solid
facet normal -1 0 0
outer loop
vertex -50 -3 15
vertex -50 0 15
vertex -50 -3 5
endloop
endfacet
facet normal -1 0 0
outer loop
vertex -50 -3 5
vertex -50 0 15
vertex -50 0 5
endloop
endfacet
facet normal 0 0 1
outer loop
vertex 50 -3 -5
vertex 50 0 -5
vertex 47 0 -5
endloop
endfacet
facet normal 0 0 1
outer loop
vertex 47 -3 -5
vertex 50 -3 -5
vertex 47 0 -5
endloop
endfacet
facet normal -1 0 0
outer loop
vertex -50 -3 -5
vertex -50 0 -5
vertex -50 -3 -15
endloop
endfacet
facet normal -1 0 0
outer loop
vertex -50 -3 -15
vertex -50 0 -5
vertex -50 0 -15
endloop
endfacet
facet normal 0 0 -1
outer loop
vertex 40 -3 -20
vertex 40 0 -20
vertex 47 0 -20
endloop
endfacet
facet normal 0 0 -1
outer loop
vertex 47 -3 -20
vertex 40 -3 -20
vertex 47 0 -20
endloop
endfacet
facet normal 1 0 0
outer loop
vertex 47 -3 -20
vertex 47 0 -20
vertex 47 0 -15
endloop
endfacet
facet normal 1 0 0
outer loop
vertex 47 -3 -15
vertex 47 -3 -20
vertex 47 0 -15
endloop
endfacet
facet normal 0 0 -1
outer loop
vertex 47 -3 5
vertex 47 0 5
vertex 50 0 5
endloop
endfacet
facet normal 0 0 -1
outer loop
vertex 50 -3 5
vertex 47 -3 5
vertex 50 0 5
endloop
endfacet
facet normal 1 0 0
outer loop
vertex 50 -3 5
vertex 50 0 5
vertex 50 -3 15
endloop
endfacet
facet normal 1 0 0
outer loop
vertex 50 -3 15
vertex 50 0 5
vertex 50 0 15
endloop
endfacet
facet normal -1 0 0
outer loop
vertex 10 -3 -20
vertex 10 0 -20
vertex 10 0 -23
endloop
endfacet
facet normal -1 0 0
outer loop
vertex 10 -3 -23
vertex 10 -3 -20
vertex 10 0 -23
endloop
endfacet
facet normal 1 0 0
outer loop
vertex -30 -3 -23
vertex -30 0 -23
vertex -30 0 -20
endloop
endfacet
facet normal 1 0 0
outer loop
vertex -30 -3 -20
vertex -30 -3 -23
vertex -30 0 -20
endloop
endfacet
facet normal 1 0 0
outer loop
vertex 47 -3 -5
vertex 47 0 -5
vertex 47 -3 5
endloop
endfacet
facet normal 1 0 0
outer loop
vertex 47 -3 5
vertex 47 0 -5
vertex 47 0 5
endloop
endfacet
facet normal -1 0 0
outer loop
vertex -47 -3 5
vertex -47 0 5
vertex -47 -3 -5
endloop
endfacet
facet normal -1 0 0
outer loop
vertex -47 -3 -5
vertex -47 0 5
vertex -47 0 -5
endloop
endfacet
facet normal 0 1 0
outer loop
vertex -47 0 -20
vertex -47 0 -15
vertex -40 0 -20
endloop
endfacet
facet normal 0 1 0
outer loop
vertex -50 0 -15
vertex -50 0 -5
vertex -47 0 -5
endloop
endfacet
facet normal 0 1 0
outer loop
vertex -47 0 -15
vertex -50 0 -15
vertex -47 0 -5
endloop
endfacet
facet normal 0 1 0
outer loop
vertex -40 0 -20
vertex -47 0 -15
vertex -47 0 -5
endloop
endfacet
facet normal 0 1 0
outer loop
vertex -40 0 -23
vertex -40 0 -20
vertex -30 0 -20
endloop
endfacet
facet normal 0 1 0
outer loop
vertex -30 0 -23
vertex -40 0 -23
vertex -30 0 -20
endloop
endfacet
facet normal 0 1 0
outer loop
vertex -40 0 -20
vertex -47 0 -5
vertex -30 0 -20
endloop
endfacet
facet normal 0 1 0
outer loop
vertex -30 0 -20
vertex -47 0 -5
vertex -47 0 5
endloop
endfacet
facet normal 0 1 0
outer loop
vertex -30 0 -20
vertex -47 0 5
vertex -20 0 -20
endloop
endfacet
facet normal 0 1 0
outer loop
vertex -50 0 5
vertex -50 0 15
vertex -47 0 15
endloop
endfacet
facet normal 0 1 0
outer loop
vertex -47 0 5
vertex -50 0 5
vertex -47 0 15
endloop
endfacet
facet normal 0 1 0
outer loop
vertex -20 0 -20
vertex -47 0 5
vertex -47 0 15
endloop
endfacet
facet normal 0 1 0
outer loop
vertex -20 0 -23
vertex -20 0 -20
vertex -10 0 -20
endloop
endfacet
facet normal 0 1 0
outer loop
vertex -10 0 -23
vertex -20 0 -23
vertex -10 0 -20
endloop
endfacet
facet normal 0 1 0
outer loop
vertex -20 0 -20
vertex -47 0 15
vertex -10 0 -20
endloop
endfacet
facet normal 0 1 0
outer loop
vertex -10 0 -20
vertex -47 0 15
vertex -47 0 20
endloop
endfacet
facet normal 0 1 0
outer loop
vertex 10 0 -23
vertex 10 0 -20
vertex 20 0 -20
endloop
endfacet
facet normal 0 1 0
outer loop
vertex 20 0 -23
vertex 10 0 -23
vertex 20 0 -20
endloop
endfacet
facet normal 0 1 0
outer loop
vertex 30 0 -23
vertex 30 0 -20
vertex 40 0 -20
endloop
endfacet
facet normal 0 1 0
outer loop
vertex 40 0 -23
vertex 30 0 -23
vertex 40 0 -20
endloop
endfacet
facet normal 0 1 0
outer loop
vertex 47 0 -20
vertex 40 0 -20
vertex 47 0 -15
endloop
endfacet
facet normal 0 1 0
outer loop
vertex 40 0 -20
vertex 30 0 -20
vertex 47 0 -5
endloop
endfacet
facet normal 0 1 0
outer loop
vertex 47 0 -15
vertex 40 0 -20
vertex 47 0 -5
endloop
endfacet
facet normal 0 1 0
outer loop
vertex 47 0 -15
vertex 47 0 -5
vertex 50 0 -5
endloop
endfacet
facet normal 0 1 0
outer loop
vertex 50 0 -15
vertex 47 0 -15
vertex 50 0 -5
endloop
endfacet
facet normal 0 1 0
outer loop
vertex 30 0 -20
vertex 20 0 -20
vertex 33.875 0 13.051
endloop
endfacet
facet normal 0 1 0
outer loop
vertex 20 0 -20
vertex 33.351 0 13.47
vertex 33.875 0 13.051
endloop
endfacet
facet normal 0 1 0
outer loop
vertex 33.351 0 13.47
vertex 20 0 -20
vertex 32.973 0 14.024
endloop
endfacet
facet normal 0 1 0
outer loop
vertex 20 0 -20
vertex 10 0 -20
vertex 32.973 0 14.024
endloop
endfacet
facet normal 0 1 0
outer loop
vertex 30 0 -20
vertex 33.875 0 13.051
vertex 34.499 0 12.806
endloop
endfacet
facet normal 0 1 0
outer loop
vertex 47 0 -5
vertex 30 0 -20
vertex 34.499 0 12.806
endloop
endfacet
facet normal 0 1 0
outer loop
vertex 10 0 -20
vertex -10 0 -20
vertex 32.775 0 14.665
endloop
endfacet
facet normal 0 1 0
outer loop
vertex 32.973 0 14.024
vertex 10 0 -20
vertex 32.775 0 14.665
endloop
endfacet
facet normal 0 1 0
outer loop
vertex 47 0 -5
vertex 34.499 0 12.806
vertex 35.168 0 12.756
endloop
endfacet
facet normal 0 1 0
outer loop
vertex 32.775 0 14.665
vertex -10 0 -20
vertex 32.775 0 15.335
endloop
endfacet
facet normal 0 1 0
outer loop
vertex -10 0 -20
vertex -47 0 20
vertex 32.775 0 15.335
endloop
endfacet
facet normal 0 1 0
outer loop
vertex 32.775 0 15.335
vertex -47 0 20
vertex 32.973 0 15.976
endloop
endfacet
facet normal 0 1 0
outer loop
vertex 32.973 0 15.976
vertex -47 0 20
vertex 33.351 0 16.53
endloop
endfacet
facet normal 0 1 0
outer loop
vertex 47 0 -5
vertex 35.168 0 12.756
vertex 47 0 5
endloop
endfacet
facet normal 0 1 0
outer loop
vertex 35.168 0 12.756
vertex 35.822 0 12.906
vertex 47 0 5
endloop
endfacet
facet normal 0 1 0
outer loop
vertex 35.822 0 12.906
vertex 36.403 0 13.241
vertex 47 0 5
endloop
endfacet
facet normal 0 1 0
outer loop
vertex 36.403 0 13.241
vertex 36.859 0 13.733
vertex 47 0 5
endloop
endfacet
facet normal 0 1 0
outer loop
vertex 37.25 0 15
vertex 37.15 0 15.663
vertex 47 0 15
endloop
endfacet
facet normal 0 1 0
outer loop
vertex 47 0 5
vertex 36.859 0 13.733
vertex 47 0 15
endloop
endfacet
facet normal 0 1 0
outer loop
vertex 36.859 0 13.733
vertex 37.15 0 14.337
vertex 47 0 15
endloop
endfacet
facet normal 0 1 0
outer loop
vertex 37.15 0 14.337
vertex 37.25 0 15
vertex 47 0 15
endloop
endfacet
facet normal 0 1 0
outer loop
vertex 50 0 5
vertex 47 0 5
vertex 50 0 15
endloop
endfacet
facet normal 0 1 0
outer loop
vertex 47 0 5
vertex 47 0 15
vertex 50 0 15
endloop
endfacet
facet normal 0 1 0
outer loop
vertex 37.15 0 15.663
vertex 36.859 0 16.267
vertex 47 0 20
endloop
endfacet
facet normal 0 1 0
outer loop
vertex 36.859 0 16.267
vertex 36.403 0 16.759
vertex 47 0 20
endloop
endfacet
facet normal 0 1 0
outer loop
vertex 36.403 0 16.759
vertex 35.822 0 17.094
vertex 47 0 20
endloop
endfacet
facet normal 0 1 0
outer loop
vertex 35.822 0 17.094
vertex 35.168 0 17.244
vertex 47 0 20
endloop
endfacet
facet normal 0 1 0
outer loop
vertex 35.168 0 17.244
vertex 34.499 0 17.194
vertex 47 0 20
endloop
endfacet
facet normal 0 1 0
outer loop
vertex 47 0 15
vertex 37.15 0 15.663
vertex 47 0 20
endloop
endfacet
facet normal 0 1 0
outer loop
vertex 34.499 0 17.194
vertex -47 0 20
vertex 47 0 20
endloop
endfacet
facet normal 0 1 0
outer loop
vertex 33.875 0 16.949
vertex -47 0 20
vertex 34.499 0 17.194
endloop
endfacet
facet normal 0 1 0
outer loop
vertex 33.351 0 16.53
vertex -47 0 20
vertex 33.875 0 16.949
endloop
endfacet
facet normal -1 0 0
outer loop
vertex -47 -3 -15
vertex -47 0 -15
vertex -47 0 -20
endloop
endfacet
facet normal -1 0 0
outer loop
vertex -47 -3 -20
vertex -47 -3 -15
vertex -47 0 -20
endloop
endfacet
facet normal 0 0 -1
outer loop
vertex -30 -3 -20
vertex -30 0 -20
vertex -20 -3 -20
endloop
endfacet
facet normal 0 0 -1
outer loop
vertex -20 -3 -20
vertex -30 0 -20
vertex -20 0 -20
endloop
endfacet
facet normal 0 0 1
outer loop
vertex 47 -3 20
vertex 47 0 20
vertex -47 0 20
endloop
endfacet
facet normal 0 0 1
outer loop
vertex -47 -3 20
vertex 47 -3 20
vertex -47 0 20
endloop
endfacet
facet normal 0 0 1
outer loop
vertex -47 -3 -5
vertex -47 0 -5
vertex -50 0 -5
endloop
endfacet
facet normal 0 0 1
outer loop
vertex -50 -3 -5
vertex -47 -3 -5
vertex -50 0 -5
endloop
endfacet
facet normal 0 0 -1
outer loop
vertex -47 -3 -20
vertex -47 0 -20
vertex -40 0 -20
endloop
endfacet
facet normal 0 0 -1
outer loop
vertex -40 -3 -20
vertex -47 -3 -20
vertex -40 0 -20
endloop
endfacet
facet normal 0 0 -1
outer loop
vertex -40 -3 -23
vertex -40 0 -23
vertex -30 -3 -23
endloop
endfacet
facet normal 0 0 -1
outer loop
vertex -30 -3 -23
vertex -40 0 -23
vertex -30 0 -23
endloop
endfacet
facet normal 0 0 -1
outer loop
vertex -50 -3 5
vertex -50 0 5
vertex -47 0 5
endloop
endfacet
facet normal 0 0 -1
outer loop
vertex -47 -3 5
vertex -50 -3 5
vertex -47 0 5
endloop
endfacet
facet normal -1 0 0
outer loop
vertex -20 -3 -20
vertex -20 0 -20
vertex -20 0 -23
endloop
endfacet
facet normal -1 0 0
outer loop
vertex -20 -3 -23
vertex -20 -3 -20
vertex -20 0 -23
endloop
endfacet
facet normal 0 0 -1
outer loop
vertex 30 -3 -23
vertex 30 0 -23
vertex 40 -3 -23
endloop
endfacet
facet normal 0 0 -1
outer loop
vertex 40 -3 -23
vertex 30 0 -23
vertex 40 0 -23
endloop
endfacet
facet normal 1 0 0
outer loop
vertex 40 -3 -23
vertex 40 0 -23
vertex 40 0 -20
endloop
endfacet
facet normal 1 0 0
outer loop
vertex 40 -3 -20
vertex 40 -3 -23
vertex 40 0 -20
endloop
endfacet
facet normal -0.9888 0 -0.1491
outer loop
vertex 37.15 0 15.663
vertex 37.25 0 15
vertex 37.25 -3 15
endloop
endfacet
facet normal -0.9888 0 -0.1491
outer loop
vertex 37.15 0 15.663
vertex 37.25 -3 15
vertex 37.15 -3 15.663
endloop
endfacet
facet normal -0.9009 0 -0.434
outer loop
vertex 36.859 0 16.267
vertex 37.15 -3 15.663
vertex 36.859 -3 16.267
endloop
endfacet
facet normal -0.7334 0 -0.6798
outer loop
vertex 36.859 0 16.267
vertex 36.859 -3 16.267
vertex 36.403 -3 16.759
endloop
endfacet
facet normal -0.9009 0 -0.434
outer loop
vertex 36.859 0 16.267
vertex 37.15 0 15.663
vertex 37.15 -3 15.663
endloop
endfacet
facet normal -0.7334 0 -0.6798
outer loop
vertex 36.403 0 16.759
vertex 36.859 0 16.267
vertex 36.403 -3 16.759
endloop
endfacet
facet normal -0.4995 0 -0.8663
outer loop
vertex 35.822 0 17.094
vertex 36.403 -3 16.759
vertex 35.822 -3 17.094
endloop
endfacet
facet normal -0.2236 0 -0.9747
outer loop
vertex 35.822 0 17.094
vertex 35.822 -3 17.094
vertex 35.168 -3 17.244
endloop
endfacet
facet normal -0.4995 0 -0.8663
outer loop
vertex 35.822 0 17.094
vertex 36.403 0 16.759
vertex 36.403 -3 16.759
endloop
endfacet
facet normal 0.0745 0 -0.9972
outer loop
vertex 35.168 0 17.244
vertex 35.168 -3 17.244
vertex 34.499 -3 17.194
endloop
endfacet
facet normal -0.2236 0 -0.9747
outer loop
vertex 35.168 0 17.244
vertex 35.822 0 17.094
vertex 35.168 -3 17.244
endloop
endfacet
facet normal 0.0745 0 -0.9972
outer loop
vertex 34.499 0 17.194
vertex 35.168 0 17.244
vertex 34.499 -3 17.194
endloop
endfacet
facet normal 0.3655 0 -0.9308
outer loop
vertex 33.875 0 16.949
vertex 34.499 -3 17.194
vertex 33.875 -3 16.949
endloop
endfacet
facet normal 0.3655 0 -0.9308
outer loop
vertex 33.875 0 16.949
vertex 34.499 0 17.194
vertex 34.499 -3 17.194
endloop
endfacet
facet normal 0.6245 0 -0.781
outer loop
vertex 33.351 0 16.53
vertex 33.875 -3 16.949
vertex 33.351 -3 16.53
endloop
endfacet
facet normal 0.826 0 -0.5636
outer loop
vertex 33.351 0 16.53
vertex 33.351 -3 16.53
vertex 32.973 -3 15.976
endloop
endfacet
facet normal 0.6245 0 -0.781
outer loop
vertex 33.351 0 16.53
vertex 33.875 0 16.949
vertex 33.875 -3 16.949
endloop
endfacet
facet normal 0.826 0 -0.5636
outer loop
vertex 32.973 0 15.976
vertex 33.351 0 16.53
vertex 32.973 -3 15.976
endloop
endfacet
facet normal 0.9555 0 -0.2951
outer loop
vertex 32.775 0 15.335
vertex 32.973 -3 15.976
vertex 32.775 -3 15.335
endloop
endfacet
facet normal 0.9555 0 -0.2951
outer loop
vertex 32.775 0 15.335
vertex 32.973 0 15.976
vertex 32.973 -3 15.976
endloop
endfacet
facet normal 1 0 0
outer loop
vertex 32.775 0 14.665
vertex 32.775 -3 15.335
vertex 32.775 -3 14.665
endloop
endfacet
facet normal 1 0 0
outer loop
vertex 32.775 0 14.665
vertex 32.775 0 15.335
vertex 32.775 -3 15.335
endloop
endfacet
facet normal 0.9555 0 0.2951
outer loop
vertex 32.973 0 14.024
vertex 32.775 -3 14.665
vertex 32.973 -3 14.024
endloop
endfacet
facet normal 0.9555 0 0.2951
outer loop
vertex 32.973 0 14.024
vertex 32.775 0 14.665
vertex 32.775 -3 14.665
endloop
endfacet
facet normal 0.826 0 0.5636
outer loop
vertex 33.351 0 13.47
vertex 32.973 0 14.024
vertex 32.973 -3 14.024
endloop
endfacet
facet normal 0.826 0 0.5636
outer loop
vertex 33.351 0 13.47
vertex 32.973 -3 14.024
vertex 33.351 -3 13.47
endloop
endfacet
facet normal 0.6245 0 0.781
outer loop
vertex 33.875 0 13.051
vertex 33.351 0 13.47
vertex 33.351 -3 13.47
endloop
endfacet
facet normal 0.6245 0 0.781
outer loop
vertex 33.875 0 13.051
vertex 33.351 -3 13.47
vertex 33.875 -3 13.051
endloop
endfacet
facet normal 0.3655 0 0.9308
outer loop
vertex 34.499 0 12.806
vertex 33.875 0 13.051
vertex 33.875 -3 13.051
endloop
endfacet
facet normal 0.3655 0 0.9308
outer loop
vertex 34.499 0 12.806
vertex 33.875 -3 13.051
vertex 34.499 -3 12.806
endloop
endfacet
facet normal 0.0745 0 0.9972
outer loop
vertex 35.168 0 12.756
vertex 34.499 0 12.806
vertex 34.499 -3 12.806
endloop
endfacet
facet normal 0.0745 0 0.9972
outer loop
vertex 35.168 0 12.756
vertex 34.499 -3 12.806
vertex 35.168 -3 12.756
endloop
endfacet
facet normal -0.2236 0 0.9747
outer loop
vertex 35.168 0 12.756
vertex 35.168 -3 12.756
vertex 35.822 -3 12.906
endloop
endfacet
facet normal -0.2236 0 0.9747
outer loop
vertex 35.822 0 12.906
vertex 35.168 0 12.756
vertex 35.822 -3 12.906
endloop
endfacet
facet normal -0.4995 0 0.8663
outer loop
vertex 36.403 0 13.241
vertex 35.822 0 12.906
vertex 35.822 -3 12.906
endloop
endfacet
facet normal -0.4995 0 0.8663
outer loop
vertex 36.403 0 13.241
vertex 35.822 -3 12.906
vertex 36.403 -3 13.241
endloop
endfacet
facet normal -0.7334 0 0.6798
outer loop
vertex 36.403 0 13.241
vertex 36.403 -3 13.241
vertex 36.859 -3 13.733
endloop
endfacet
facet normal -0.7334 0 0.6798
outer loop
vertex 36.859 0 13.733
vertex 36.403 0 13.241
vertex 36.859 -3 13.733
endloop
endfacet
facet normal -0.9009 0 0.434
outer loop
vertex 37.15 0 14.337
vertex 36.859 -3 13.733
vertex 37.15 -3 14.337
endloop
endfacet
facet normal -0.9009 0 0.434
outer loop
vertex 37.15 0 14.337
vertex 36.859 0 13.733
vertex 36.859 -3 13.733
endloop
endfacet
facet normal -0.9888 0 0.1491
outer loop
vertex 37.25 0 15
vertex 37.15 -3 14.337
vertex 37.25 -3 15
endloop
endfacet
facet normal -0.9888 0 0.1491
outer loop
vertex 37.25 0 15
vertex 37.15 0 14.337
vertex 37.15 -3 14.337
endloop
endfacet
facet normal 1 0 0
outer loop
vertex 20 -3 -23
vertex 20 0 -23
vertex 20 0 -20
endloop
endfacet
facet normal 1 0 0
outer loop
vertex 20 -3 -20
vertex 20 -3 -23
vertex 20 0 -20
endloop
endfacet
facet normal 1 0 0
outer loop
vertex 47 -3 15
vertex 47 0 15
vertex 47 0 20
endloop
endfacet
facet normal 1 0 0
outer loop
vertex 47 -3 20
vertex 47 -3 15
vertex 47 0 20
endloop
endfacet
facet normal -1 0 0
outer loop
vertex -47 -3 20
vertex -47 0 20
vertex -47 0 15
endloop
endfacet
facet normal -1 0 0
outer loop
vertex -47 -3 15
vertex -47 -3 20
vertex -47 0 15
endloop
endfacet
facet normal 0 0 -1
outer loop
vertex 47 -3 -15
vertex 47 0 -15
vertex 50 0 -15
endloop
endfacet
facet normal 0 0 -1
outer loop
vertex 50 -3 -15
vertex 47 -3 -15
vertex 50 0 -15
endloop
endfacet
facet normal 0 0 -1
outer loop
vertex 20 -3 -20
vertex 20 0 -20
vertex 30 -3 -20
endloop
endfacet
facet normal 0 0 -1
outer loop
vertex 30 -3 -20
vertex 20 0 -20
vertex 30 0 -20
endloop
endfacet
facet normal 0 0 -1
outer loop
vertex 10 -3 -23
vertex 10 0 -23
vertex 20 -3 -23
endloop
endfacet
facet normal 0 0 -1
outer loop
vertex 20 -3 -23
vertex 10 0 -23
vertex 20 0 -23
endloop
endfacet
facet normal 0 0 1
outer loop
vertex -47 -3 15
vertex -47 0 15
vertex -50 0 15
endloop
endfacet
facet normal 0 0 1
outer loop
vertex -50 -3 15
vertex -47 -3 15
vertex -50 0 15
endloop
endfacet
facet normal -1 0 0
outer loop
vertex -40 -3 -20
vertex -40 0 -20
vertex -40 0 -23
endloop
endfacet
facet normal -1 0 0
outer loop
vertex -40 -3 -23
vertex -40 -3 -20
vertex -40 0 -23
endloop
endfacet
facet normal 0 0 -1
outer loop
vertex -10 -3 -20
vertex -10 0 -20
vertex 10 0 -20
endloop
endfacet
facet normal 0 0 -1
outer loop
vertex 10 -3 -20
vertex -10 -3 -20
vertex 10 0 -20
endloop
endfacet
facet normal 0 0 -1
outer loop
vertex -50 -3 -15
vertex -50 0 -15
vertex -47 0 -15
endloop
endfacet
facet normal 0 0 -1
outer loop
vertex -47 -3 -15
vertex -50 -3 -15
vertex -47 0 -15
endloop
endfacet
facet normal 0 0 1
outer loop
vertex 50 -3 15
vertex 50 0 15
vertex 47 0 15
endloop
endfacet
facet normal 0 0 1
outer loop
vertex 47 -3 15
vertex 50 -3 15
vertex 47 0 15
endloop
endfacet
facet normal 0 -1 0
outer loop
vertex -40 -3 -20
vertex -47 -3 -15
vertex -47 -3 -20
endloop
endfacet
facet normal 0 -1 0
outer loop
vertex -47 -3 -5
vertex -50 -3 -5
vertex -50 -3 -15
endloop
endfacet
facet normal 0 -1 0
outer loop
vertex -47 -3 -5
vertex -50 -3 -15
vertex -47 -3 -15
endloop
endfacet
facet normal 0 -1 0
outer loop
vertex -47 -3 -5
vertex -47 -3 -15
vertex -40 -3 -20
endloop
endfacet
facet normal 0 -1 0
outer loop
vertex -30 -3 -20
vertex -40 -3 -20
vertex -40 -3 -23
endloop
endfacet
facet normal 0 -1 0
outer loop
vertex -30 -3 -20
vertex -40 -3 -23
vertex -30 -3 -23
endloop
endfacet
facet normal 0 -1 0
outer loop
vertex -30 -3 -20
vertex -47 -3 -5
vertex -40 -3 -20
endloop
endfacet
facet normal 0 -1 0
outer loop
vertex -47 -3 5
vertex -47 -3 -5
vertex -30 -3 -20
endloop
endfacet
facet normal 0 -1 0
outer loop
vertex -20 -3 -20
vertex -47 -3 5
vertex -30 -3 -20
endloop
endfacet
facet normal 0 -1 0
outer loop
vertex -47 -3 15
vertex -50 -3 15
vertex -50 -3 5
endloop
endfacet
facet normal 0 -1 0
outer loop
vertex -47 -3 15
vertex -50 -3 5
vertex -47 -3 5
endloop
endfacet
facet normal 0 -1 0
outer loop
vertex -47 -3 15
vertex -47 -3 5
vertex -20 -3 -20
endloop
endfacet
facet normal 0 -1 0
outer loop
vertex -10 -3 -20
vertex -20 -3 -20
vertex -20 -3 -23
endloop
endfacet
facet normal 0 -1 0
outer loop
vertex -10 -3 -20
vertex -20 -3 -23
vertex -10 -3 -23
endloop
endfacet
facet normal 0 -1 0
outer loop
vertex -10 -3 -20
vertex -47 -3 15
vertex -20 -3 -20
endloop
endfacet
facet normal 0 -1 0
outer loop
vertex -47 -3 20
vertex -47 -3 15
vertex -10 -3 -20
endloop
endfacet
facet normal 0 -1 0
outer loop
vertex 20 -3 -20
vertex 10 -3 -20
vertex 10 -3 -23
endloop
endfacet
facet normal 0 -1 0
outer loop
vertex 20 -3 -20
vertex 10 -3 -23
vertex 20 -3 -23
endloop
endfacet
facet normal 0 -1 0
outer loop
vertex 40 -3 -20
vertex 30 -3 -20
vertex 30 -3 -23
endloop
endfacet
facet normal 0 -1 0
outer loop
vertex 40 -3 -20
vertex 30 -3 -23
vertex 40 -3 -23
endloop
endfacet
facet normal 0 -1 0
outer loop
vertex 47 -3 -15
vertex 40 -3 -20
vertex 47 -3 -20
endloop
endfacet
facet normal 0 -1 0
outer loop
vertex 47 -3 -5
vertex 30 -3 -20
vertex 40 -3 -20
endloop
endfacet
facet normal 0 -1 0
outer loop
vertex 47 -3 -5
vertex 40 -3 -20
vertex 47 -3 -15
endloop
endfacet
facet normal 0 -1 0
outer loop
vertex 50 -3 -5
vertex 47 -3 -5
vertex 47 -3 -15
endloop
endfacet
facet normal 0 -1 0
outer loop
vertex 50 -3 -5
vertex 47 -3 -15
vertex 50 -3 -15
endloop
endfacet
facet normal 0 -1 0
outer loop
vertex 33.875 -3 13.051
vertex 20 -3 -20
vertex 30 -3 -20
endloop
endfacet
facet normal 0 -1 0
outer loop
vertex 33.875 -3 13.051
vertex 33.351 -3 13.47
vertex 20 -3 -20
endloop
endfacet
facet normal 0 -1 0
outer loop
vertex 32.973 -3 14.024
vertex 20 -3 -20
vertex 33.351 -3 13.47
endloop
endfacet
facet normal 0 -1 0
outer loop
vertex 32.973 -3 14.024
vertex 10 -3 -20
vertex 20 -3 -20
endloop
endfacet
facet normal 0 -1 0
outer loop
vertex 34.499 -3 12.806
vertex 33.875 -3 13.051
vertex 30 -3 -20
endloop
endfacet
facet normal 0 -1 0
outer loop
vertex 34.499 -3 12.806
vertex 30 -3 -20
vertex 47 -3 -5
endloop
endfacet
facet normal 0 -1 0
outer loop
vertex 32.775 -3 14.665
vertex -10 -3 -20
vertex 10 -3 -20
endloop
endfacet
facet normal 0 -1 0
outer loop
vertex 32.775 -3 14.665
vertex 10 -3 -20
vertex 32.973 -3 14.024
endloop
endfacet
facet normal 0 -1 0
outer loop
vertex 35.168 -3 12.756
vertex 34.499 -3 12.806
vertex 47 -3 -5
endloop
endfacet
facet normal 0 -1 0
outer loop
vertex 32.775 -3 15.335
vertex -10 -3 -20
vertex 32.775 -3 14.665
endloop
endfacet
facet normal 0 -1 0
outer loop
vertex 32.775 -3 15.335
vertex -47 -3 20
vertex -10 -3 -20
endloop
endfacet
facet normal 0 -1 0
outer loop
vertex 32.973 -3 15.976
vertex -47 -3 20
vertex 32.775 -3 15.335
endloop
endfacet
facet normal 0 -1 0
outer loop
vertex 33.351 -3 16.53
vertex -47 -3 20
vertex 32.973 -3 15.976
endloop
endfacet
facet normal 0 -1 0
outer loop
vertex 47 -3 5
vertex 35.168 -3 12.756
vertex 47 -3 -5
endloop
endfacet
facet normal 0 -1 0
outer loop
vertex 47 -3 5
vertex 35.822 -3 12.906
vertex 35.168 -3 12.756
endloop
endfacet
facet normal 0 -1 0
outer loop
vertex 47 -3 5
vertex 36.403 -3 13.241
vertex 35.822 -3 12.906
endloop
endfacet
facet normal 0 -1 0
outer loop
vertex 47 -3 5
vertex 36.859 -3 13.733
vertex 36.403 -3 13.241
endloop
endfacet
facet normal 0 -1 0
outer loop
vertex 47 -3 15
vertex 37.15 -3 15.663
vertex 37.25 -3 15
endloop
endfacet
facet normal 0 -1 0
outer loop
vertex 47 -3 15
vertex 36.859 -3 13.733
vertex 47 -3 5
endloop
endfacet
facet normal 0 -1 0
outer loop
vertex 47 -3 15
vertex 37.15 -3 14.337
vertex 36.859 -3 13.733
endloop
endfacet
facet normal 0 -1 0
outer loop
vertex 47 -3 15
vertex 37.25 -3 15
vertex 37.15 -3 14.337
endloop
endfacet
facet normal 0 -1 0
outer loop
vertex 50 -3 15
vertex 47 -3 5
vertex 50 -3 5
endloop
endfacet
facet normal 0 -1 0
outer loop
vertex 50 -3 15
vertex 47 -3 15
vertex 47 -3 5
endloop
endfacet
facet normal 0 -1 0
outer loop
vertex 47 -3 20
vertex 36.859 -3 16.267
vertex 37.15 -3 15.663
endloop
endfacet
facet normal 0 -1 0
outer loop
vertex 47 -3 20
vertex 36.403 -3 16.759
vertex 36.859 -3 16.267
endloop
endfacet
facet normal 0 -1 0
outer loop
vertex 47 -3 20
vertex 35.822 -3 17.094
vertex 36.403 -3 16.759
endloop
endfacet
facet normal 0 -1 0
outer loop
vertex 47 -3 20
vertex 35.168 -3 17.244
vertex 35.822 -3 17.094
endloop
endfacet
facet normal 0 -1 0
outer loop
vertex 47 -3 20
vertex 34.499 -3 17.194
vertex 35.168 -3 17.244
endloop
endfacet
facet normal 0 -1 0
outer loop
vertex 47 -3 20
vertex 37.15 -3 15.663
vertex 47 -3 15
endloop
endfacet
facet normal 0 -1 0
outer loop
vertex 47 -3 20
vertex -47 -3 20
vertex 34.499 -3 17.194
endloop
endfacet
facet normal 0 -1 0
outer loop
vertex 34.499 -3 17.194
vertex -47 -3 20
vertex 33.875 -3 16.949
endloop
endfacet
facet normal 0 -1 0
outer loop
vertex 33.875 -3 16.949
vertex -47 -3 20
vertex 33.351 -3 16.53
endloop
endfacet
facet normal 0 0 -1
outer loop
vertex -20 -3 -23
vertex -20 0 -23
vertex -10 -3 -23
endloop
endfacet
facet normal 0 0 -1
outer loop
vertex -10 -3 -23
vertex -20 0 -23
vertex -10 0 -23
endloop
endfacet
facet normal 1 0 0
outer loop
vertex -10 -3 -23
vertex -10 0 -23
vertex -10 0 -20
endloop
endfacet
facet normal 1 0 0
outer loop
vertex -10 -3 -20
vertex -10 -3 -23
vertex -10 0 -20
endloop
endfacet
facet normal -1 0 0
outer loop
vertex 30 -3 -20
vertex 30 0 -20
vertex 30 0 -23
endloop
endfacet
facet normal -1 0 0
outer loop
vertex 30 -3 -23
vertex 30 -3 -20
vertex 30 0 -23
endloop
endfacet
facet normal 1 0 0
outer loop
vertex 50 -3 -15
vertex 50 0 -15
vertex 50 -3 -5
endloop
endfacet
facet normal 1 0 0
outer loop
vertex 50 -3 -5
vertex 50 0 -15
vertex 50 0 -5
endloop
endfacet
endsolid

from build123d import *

# Parameters (mm, degrees)
F0_R     = 2.25
F1_DEPTH = 3


with BuildPart() as f1:
    # F0 (on Front) → F1 (new body)
    with BuildSketch(Plane.XZ):
        Polygon((-10, -20), (0, -20), (10, -20), (10, -23), (20, -23), (20, -20), (30, -20), (30, -23), (40, -23), (40, -20), (47, -20), (47, -15), (50, -15), (50, -5), (47, -5), (47, 5), (50, 5), (50, 15), (47, 15), (47, 20), (-47, 20), (-47, 15), (-50, 15), (-50, 5), (-47, 5), (-47, -5), (-50, -5), (-50, -15), (-47, -15), (-47, -20), (-40, -20), (-40, -23), (-30, -23), (-30, -20), (-20, -20), (-20, -23), (-10, -23), align=None)
        with Locations((35, 15)):
            Circle(F0_R, mode=Mode.SUBTRACT)
    extrude(amount=F1_DEPTH)


solid = f1.part
